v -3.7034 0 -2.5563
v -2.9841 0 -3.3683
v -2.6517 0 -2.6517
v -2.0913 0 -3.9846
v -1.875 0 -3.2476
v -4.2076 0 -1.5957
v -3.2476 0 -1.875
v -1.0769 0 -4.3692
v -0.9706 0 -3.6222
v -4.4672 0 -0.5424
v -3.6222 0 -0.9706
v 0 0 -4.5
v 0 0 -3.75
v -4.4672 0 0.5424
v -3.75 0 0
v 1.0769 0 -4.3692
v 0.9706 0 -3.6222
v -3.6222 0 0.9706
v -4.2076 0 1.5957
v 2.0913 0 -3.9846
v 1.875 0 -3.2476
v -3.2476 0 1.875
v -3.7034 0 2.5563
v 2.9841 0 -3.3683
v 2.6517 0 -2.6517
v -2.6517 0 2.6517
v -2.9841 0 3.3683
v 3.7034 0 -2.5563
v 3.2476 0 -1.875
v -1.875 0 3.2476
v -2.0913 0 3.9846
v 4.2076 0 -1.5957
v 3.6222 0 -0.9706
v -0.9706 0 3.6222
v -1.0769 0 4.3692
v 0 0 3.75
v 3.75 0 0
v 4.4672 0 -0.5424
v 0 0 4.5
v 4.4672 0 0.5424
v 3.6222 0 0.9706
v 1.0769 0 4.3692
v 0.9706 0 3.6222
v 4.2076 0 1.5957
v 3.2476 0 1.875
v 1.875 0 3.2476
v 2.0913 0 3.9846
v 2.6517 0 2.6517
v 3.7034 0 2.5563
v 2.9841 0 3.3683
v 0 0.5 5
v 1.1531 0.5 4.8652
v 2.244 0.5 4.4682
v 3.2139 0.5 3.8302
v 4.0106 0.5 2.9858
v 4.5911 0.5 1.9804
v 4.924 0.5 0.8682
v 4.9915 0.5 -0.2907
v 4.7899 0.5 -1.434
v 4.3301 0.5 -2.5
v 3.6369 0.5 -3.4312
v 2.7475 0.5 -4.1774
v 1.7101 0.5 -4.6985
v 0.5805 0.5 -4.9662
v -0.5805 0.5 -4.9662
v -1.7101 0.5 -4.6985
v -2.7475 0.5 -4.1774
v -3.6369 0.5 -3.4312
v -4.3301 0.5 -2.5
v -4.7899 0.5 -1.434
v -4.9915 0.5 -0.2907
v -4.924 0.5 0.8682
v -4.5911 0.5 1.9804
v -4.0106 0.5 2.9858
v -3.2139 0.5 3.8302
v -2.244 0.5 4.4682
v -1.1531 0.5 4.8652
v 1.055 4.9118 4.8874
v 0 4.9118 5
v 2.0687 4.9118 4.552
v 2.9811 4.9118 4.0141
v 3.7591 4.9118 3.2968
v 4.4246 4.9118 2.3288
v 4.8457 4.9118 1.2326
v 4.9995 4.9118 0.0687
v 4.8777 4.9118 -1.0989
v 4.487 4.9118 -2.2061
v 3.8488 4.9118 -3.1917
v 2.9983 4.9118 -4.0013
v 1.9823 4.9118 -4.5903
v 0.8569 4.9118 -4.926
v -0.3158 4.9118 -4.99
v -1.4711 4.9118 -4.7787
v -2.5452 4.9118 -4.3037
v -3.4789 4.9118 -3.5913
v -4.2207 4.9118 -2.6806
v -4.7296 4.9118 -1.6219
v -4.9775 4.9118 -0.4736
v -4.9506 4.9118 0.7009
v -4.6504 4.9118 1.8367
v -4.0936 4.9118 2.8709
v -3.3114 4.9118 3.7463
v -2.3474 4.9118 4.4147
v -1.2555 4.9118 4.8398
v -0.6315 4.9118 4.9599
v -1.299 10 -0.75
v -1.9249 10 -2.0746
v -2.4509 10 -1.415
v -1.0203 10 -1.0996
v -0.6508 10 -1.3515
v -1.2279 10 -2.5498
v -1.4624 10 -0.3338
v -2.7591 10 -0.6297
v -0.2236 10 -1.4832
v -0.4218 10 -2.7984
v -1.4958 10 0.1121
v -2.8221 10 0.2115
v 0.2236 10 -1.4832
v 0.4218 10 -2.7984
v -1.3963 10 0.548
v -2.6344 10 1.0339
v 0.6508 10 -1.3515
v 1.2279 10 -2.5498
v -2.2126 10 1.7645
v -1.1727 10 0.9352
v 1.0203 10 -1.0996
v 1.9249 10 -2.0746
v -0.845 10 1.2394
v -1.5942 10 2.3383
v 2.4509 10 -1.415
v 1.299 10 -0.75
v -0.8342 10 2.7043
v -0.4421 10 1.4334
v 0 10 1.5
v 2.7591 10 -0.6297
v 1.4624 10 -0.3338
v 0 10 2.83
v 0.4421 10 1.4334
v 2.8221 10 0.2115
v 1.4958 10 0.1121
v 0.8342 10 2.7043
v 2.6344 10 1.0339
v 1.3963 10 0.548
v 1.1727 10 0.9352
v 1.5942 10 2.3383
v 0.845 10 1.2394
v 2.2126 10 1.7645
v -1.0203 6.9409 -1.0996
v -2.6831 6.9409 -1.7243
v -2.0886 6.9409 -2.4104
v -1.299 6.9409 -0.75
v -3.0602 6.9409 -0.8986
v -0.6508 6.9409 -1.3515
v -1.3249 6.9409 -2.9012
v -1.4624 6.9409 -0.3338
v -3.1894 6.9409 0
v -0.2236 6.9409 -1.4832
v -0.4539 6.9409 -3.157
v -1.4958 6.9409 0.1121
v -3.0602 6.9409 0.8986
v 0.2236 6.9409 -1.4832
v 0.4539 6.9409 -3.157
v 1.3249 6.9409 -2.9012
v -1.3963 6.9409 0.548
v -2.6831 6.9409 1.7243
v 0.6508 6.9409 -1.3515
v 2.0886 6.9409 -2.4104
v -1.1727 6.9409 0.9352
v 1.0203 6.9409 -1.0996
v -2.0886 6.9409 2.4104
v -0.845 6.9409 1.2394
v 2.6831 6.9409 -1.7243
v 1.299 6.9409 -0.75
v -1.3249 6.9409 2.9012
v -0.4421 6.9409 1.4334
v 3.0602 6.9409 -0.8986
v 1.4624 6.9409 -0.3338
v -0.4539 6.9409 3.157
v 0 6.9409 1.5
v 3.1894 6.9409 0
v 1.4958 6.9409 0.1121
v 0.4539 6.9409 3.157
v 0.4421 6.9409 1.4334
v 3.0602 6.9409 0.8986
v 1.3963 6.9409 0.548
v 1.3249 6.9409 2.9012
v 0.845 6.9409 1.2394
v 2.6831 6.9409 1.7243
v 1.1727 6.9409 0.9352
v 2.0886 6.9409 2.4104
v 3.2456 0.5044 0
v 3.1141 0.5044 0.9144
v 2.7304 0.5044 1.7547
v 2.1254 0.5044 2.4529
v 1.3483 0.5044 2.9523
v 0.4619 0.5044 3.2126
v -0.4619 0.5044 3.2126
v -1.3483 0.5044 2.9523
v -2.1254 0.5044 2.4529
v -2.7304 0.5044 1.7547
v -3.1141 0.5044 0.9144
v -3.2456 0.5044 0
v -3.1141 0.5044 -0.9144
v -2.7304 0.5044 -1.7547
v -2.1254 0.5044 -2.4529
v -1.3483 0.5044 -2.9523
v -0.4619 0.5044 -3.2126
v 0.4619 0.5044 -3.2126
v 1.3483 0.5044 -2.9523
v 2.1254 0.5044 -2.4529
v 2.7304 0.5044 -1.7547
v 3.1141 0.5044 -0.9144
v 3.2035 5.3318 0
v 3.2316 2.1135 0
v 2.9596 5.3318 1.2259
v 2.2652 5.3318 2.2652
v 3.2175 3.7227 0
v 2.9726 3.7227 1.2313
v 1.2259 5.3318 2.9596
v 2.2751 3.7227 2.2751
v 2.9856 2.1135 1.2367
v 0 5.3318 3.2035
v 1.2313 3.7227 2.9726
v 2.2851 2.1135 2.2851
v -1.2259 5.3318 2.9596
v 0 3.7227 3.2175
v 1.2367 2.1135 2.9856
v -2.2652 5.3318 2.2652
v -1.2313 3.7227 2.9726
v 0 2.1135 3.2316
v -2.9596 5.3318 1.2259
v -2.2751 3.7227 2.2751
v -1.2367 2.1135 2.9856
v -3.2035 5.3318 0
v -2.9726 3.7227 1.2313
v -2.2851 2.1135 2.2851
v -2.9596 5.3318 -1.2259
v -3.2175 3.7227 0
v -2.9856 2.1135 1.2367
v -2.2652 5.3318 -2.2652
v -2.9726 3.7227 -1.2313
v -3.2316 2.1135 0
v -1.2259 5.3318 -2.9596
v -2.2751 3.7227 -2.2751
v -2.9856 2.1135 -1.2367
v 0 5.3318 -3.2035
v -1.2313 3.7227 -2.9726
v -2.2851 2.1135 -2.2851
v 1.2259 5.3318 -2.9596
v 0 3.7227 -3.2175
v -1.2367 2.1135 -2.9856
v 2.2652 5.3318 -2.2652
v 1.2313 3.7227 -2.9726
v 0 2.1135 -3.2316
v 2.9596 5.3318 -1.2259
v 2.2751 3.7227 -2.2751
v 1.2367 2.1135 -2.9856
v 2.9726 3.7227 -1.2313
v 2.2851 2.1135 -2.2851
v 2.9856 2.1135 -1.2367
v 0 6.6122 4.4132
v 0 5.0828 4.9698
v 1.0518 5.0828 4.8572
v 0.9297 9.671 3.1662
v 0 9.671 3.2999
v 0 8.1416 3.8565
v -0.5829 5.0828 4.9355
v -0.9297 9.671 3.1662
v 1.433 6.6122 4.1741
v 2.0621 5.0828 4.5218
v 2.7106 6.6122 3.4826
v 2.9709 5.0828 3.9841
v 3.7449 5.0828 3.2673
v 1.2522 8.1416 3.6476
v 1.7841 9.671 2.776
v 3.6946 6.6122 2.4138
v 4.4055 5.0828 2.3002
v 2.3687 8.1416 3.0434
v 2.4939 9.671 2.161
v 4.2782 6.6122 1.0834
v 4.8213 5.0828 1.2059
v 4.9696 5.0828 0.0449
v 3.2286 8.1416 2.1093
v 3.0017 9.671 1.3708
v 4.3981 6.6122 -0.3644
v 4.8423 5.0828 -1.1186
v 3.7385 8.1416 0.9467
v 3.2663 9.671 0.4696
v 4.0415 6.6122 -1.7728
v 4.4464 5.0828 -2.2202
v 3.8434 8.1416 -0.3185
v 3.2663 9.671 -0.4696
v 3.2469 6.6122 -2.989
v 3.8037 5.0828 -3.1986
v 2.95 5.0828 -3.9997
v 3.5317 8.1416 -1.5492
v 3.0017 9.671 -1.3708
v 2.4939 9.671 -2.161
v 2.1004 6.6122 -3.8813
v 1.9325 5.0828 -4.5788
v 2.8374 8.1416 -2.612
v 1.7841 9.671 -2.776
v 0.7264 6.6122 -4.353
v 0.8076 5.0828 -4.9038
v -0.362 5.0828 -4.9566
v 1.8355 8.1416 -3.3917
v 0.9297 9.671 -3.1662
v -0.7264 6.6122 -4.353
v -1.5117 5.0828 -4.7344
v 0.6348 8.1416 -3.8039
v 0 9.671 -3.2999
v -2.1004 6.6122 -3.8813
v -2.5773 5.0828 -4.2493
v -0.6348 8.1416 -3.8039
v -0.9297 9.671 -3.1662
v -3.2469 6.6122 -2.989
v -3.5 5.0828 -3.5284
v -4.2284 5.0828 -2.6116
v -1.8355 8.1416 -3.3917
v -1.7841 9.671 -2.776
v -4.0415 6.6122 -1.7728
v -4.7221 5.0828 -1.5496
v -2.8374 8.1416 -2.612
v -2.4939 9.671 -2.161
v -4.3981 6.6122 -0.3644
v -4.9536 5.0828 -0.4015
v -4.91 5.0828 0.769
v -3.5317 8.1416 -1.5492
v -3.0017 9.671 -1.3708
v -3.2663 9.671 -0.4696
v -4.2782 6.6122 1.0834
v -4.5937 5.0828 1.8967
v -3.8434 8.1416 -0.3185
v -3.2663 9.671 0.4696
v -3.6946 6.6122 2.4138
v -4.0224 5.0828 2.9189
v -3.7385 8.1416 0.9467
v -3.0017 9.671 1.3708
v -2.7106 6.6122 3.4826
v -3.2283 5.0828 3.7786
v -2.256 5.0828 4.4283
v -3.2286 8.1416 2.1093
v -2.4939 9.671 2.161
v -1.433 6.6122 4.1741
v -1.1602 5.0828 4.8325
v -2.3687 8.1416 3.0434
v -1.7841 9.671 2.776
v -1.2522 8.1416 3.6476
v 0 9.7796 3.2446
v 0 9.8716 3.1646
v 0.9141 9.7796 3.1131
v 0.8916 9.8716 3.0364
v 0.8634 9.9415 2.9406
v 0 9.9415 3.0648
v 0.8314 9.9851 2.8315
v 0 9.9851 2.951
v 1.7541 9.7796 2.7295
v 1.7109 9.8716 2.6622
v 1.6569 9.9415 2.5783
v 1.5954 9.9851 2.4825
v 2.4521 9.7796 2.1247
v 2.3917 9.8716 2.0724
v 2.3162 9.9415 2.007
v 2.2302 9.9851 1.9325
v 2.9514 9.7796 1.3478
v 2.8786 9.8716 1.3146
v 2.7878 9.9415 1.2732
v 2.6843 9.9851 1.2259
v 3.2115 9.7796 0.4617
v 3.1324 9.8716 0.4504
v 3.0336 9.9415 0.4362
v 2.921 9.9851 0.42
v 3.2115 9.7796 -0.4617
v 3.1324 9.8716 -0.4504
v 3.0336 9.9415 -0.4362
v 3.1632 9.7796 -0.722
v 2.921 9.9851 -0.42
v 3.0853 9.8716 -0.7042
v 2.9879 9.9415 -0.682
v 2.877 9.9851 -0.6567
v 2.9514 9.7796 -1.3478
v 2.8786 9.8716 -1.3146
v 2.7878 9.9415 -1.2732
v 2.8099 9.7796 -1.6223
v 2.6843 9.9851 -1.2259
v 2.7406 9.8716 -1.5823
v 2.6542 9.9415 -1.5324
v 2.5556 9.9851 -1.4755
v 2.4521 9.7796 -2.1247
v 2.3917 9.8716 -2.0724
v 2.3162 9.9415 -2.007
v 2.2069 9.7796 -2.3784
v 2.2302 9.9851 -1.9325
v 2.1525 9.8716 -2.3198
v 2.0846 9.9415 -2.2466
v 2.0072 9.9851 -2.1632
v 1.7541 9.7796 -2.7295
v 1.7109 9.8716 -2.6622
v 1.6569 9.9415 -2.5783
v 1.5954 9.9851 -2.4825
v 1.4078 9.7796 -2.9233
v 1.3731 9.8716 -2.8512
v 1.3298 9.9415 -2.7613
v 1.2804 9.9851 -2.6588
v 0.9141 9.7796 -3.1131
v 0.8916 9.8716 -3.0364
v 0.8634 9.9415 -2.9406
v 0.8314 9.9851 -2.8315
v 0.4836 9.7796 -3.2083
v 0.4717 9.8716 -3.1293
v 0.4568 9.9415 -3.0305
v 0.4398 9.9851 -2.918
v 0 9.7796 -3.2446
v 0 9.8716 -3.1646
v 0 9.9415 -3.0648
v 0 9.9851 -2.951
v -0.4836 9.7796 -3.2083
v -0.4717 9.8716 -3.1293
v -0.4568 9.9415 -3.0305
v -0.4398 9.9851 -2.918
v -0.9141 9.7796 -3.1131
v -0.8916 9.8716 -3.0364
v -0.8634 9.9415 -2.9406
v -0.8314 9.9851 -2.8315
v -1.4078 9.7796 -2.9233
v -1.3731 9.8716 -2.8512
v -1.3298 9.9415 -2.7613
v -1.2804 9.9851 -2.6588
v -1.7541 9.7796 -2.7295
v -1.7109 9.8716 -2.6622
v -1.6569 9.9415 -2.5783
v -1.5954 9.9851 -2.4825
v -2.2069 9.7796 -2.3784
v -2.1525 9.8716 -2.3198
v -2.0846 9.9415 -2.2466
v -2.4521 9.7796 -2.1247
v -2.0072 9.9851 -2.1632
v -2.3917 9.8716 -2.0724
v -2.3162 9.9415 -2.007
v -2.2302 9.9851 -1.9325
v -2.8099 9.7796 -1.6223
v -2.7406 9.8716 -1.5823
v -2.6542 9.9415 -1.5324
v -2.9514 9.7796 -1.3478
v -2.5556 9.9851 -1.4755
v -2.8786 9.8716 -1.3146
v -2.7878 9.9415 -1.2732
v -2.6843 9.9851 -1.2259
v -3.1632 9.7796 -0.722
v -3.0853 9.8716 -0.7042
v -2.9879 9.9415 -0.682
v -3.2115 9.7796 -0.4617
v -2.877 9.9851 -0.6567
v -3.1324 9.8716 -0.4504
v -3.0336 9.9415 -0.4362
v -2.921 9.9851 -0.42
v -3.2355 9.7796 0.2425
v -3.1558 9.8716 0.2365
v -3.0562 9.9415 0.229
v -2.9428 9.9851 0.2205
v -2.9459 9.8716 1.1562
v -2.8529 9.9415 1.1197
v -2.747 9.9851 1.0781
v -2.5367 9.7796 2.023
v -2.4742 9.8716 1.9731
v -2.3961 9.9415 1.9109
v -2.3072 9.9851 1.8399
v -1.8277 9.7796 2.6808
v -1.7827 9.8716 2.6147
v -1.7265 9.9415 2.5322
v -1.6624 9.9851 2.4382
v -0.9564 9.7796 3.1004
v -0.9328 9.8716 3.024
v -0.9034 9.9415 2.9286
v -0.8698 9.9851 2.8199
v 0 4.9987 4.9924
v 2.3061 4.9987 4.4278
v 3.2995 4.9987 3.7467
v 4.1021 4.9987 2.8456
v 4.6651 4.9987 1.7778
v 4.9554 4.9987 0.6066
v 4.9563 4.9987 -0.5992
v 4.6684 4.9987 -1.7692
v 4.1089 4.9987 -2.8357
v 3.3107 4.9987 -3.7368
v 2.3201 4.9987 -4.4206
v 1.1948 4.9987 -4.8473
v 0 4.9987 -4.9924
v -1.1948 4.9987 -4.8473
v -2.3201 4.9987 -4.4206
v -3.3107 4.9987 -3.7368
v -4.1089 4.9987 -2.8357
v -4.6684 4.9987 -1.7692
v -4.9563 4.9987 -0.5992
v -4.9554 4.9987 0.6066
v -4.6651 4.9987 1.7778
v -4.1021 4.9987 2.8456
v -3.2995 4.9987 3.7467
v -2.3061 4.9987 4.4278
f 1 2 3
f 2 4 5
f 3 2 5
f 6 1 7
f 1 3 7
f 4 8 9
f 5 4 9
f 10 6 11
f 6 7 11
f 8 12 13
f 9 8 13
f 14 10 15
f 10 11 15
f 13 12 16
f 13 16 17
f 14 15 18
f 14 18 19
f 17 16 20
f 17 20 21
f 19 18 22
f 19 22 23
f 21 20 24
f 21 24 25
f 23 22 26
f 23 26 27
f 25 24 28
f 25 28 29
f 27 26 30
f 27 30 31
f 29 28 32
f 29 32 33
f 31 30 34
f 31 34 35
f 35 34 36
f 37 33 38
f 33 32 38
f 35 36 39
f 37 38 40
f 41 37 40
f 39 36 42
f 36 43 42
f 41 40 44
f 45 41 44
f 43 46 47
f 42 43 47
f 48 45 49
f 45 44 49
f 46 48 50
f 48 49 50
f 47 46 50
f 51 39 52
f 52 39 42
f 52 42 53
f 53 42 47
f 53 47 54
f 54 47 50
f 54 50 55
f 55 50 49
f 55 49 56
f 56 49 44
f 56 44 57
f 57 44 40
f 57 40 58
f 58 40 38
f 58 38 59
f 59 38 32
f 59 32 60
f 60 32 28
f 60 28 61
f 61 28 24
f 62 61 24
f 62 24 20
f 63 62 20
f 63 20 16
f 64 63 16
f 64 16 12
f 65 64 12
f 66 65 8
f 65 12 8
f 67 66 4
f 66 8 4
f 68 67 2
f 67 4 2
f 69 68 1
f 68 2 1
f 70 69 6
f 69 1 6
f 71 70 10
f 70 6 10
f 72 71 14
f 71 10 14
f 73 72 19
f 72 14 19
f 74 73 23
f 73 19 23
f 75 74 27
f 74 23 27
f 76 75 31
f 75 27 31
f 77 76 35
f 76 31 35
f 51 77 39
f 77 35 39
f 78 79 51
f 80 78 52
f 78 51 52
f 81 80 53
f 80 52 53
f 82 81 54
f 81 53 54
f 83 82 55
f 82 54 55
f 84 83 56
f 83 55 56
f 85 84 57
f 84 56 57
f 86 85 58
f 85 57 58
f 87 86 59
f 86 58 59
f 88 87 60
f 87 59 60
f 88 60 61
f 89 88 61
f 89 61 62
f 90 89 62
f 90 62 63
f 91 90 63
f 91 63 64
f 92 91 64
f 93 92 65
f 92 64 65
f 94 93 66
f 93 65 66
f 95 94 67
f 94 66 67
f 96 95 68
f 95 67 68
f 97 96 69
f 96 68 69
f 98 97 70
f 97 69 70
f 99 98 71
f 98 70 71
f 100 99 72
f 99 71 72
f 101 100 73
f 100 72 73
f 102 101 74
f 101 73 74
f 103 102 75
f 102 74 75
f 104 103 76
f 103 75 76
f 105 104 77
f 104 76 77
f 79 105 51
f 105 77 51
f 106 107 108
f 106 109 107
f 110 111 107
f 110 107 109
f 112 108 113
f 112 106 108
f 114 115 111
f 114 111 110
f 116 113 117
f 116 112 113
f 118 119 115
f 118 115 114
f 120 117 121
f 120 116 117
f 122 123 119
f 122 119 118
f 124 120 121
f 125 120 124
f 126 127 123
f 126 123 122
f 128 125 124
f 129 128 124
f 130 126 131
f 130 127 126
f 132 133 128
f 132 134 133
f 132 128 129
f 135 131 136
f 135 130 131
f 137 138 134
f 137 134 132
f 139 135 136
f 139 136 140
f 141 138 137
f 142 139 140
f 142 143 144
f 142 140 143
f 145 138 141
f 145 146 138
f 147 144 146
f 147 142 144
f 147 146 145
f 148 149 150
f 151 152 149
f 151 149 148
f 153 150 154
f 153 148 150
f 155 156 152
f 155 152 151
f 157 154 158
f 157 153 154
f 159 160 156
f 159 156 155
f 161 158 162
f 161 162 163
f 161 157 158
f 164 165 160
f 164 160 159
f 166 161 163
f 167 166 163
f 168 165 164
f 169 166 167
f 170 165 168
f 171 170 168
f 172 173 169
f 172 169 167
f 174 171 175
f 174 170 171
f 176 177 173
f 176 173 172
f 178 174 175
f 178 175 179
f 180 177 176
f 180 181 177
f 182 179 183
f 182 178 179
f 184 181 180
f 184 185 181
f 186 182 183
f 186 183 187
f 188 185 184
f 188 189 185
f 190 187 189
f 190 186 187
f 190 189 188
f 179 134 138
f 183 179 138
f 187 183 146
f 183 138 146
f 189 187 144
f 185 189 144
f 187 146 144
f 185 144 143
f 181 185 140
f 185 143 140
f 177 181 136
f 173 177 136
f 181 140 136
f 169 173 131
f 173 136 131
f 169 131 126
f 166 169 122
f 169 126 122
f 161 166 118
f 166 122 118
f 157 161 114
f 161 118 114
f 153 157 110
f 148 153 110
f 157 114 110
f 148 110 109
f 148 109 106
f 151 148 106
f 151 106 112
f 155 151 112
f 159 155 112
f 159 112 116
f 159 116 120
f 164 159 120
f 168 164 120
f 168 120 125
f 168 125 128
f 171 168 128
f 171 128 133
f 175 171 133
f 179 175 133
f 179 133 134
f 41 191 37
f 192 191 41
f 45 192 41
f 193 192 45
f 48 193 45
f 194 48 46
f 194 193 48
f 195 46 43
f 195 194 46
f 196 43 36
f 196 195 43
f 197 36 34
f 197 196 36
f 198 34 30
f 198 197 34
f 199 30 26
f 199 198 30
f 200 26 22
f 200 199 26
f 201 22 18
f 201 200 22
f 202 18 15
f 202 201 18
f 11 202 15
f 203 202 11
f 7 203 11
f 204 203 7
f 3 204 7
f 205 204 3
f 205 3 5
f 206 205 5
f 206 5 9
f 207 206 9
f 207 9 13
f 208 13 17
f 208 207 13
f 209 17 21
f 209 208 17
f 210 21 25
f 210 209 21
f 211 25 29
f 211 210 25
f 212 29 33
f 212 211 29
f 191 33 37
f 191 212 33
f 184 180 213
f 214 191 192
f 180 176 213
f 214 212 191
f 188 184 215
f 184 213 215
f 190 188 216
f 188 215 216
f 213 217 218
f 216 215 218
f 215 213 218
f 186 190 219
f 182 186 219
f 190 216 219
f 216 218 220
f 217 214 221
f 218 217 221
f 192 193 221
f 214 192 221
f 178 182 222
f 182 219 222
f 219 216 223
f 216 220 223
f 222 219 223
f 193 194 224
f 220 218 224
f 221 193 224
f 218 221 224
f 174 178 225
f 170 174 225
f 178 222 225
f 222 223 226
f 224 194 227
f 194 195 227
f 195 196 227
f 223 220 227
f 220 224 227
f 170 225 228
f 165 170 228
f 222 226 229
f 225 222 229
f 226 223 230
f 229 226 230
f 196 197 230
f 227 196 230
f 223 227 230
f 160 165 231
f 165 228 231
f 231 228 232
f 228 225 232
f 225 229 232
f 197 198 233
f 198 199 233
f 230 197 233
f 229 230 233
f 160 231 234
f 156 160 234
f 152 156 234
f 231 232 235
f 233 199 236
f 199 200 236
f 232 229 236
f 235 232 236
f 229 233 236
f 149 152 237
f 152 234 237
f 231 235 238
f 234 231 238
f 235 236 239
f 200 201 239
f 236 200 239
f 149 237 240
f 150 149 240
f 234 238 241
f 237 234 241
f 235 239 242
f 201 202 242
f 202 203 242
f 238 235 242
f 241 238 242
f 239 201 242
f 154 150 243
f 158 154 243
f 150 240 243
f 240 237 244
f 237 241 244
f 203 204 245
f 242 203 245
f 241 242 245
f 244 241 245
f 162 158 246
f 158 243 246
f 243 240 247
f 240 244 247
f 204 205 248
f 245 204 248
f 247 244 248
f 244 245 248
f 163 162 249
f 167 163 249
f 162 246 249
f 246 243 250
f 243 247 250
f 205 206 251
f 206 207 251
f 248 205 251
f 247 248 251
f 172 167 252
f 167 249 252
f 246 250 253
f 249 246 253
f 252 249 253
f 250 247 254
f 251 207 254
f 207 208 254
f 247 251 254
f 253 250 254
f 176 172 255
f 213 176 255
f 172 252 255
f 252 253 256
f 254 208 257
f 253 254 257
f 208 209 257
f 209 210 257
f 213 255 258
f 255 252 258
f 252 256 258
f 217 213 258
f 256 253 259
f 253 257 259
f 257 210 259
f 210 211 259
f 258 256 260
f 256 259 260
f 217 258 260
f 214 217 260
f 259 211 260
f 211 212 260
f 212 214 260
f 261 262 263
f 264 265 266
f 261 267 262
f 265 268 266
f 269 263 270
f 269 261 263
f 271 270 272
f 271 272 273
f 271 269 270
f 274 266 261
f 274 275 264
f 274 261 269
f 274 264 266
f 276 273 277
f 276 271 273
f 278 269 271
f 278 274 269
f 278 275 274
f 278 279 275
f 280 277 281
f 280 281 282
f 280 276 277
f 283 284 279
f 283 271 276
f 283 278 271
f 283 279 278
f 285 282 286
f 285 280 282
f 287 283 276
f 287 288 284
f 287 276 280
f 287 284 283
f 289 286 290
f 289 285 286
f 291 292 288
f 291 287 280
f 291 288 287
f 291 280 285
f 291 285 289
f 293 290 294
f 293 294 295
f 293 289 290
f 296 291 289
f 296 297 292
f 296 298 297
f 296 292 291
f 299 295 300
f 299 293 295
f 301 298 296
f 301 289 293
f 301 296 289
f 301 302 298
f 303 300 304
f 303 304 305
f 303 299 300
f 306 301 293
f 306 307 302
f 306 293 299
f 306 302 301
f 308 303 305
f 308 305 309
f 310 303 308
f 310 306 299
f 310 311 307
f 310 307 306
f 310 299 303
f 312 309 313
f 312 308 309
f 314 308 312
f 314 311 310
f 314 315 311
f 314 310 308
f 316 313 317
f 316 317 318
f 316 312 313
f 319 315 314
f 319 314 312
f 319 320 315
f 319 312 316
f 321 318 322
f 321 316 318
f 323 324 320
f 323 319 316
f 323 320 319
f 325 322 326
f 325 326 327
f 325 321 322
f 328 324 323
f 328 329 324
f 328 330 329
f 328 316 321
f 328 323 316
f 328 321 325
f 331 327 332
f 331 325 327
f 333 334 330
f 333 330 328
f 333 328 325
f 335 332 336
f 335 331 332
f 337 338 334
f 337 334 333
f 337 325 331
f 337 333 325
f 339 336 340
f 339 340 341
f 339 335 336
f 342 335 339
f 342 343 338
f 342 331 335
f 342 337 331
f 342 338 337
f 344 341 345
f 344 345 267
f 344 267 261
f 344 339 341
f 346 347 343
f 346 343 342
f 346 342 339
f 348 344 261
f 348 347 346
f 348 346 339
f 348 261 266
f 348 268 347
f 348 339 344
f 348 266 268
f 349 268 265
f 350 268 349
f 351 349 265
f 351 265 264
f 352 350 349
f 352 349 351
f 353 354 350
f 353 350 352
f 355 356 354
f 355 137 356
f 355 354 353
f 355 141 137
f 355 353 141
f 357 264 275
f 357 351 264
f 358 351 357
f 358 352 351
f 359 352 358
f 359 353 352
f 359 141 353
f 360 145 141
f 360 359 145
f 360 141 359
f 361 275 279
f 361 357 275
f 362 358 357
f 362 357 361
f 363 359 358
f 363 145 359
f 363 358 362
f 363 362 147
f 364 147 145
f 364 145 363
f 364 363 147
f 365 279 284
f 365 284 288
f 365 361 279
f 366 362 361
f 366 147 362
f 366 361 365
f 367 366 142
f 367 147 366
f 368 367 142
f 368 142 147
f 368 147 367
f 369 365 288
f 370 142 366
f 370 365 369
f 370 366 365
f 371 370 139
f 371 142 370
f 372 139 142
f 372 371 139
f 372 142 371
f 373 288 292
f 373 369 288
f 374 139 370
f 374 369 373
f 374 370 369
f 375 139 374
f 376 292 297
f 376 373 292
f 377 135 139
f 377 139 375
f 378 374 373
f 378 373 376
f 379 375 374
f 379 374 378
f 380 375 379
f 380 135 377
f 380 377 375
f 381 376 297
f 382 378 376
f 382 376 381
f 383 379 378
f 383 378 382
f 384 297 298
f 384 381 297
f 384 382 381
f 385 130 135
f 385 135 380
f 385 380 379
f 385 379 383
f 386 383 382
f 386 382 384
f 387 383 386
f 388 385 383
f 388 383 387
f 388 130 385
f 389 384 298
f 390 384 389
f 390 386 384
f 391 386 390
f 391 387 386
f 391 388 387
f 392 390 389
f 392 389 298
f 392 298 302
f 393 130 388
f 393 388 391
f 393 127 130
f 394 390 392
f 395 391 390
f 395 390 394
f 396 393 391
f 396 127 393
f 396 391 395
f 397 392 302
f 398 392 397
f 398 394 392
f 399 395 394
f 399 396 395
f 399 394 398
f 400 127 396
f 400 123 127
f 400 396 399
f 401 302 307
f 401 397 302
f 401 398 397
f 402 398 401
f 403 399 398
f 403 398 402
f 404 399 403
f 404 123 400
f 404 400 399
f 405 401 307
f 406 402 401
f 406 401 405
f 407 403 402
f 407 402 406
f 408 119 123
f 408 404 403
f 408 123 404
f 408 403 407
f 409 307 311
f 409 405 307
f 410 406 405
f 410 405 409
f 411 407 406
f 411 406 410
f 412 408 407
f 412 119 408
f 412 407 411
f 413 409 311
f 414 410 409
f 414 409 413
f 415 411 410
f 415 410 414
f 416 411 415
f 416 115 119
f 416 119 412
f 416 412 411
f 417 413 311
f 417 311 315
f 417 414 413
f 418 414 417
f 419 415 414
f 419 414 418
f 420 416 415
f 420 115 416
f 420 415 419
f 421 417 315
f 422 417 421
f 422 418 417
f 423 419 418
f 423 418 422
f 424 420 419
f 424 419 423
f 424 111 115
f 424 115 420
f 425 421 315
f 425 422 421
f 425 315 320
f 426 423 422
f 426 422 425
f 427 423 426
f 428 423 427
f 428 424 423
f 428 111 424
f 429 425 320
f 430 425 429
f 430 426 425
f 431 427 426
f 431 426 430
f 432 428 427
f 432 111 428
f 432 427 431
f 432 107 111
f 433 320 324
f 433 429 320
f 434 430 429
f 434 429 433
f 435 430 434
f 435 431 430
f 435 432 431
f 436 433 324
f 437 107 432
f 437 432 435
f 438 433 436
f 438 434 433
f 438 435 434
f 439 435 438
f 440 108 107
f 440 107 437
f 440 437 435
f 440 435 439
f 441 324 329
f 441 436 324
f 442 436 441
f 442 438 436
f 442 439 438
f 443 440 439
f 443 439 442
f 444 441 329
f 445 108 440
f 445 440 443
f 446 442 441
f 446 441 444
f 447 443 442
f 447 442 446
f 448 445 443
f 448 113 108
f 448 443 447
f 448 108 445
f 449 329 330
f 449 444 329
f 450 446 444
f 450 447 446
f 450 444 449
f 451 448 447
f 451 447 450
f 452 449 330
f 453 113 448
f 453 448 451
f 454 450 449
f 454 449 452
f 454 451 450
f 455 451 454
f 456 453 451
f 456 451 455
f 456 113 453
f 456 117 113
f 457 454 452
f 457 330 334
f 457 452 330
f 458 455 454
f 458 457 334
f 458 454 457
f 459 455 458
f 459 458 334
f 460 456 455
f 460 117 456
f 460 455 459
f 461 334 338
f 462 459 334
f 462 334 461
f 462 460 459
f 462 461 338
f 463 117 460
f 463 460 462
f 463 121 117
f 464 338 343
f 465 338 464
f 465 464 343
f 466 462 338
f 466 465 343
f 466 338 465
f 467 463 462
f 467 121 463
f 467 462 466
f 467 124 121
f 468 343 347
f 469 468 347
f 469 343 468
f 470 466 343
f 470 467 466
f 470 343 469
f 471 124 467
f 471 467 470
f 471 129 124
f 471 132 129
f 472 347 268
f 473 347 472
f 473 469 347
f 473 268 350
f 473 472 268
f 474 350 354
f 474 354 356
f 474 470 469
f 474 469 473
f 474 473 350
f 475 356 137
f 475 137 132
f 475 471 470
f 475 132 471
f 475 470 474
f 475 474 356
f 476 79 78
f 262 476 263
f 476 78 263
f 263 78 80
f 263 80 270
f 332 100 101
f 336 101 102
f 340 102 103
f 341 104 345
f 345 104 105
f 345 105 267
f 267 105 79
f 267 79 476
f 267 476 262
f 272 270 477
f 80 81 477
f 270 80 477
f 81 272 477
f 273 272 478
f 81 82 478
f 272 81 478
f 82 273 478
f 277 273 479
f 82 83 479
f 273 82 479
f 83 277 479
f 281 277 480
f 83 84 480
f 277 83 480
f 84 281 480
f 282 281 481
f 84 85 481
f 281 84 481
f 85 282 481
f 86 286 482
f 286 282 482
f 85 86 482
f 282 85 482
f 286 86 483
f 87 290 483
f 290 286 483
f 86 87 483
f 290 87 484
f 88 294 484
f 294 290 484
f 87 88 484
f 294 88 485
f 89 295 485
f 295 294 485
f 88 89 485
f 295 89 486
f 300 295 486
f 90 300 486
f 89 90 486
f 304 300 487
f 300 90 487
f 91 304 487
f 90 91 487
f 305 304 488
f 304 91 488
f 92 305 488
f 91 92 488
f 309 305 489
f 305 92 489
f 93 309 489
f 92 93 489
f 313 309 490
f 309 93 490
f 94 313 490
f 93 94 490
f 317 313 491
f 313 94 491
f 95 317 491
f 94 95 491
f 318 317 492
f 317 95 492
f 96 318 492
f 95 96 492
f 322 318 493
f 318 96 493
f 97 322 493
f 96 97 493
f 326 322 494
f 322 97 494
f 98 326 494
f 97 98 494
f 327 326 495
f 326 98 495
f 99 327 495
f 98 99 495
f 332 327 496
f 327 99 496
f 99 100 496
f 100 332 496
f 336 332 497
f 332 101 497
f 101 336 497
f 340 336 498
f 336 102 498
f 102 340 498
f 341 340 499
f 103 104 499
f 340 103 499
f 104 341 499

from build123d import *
from OCP.BRepFilletAPI import BRepFilletAPI_MakeChamfer

# Parameters (mm, degrees)
SKETCH1_R           = 5
BOSS_EXTRUDE1_DEPTH = 10
SKETCH2_R           = 1.5
CUT_EXTRUDE1_DEPTH  = 13.247448714
CHAMFER1_SIZE       = 5
CHAMFER1_SIZE2      = 1.819851171
SKETCH3_R           = 3.25
CUT_EXTRUDE2_DEPTH  = 6.940927836
CUT_EXTRUDE2_DRAFT  = -0.5
CHAMFER2_SIZE       = 0.5
CHAMFER2_SIZE2      = 0.504421055
FILLET1_R           = 0.5


with BuildPart() as part:
    # Sketch1 → Boss-Extrude1 (new body)
    with BuildSketch(Plane(origin=(0, 0, 0), x_dir=(1, 0, 0), z_dir=(0, 1, 0))):
        with Locations(Location((0, 0, 0), (0, 0, 270))):
            Circle(SKETCH1_R)
    extrude(amount=BOSS_EXTRUDE1_DEPTH)

    # Sketch2 → Cut-Extrude1 (cut, through all)
    with BuildSketch(Plane(origin=(0, 10, 0), x_dir=(1, 0, 0), z_dir=(0, 1, 0))):
        with Locations(Location((0, 0, 0), (0, 0, 270))):
            Circle(SKETCH2_R)
    extrude(amount=-CUT_EXTRUDE1_DEPTH, mode=Mode.SUBTRACT)

    # Chamfer1
    chamfer1_edges = [part.edges().sort_by_distance(p)[0] for p in [
        (0, 10, -5),
    ]]
    chamfer1_side = [part.faces().sort_by_distance(p)[0] for p in [
        (0, 5, -5),
    ]]
    chamfer(chamfer1_edges, length=CHAMFER1_SIZE, length2=CHAMFER1_SIZE2, reference=chamfer1_side[0])


with BuildPart() as cut_extrude2_tool:
    # Sketch3 → Cut-Extrude2 (with draft: the straight prism first)
    with BuildSketch(Plane.XZ):
        Circle(SKETCH3_R)
    extrude(amount=-CUT_EXTRUDE2_DEPTH)
    # Cut-Extrude2: the draft: its side faces are tilted about the plane it starts from
    cut_extrude2_sides = [cut_extrude2_tool.faces().sort_by_distance(p)[0] for p in [
        (-3.25, 3.470463918, 0),
    ]]
    draft(cut_extrude2_sides, Plane.XZ, CUT_EXTRUDE2_DRAFT)


with BuildPart() as part_1:
    add(part.part)

    # Cut-Extrude2: cut by cut_extrude2_tool
    add(cut_extrude2_tool.part, mode=Mode.SUBTRACT)

    # Chamfer2: one chamfer whose edges measure the first distance from different faces: ONE call of the kernel's chamfer builder (chamfer() names one face for all edges)
    chamfer2_edges_1 = [part_1.edges().sort_by_distance(p)[0] for p in [
        (-3.25, 0, 0),
    ]]
    chamfer2_side_1 = [part_1.faces().sort_by_distance(p)[0] for p in [
        (0, 0, -4.858578644),
    ]]
    chamfer2_edges_2 = [part_1.edges().sort_by_distance(p)[0] for p in [
        (0, 0, -5),
    ]]
    chamfer2 = BRepFilletAPI_MakeChamfer(part_1.part.solid().wrapped)
    for e in chamfer2_edges_1:
        chamfer2.Add(CHAMFER2_SIZE, CHAMFER2_SIZE2, e.wrapped, chamfer2_side_1[0].wrapped)  # the first distance lies on this face
    for e in chamfer2_edges_2:
        chamfer2.Add(CHAMFER2_SIZE, e.wrapped)
    add(Compound.cast(chamfer2.Shape()), mode=Mode.REPLACE)

    # Fillet1
    fillet1_edges = [part_1.edges().sort_by_distance(p)[0] for p in [
        (0, 5, -5),
        (0, 10, -3.180148829),
    ]]
    fillet(fillet1_edges, radius=FILLET1_R)


solid = part_1.part
